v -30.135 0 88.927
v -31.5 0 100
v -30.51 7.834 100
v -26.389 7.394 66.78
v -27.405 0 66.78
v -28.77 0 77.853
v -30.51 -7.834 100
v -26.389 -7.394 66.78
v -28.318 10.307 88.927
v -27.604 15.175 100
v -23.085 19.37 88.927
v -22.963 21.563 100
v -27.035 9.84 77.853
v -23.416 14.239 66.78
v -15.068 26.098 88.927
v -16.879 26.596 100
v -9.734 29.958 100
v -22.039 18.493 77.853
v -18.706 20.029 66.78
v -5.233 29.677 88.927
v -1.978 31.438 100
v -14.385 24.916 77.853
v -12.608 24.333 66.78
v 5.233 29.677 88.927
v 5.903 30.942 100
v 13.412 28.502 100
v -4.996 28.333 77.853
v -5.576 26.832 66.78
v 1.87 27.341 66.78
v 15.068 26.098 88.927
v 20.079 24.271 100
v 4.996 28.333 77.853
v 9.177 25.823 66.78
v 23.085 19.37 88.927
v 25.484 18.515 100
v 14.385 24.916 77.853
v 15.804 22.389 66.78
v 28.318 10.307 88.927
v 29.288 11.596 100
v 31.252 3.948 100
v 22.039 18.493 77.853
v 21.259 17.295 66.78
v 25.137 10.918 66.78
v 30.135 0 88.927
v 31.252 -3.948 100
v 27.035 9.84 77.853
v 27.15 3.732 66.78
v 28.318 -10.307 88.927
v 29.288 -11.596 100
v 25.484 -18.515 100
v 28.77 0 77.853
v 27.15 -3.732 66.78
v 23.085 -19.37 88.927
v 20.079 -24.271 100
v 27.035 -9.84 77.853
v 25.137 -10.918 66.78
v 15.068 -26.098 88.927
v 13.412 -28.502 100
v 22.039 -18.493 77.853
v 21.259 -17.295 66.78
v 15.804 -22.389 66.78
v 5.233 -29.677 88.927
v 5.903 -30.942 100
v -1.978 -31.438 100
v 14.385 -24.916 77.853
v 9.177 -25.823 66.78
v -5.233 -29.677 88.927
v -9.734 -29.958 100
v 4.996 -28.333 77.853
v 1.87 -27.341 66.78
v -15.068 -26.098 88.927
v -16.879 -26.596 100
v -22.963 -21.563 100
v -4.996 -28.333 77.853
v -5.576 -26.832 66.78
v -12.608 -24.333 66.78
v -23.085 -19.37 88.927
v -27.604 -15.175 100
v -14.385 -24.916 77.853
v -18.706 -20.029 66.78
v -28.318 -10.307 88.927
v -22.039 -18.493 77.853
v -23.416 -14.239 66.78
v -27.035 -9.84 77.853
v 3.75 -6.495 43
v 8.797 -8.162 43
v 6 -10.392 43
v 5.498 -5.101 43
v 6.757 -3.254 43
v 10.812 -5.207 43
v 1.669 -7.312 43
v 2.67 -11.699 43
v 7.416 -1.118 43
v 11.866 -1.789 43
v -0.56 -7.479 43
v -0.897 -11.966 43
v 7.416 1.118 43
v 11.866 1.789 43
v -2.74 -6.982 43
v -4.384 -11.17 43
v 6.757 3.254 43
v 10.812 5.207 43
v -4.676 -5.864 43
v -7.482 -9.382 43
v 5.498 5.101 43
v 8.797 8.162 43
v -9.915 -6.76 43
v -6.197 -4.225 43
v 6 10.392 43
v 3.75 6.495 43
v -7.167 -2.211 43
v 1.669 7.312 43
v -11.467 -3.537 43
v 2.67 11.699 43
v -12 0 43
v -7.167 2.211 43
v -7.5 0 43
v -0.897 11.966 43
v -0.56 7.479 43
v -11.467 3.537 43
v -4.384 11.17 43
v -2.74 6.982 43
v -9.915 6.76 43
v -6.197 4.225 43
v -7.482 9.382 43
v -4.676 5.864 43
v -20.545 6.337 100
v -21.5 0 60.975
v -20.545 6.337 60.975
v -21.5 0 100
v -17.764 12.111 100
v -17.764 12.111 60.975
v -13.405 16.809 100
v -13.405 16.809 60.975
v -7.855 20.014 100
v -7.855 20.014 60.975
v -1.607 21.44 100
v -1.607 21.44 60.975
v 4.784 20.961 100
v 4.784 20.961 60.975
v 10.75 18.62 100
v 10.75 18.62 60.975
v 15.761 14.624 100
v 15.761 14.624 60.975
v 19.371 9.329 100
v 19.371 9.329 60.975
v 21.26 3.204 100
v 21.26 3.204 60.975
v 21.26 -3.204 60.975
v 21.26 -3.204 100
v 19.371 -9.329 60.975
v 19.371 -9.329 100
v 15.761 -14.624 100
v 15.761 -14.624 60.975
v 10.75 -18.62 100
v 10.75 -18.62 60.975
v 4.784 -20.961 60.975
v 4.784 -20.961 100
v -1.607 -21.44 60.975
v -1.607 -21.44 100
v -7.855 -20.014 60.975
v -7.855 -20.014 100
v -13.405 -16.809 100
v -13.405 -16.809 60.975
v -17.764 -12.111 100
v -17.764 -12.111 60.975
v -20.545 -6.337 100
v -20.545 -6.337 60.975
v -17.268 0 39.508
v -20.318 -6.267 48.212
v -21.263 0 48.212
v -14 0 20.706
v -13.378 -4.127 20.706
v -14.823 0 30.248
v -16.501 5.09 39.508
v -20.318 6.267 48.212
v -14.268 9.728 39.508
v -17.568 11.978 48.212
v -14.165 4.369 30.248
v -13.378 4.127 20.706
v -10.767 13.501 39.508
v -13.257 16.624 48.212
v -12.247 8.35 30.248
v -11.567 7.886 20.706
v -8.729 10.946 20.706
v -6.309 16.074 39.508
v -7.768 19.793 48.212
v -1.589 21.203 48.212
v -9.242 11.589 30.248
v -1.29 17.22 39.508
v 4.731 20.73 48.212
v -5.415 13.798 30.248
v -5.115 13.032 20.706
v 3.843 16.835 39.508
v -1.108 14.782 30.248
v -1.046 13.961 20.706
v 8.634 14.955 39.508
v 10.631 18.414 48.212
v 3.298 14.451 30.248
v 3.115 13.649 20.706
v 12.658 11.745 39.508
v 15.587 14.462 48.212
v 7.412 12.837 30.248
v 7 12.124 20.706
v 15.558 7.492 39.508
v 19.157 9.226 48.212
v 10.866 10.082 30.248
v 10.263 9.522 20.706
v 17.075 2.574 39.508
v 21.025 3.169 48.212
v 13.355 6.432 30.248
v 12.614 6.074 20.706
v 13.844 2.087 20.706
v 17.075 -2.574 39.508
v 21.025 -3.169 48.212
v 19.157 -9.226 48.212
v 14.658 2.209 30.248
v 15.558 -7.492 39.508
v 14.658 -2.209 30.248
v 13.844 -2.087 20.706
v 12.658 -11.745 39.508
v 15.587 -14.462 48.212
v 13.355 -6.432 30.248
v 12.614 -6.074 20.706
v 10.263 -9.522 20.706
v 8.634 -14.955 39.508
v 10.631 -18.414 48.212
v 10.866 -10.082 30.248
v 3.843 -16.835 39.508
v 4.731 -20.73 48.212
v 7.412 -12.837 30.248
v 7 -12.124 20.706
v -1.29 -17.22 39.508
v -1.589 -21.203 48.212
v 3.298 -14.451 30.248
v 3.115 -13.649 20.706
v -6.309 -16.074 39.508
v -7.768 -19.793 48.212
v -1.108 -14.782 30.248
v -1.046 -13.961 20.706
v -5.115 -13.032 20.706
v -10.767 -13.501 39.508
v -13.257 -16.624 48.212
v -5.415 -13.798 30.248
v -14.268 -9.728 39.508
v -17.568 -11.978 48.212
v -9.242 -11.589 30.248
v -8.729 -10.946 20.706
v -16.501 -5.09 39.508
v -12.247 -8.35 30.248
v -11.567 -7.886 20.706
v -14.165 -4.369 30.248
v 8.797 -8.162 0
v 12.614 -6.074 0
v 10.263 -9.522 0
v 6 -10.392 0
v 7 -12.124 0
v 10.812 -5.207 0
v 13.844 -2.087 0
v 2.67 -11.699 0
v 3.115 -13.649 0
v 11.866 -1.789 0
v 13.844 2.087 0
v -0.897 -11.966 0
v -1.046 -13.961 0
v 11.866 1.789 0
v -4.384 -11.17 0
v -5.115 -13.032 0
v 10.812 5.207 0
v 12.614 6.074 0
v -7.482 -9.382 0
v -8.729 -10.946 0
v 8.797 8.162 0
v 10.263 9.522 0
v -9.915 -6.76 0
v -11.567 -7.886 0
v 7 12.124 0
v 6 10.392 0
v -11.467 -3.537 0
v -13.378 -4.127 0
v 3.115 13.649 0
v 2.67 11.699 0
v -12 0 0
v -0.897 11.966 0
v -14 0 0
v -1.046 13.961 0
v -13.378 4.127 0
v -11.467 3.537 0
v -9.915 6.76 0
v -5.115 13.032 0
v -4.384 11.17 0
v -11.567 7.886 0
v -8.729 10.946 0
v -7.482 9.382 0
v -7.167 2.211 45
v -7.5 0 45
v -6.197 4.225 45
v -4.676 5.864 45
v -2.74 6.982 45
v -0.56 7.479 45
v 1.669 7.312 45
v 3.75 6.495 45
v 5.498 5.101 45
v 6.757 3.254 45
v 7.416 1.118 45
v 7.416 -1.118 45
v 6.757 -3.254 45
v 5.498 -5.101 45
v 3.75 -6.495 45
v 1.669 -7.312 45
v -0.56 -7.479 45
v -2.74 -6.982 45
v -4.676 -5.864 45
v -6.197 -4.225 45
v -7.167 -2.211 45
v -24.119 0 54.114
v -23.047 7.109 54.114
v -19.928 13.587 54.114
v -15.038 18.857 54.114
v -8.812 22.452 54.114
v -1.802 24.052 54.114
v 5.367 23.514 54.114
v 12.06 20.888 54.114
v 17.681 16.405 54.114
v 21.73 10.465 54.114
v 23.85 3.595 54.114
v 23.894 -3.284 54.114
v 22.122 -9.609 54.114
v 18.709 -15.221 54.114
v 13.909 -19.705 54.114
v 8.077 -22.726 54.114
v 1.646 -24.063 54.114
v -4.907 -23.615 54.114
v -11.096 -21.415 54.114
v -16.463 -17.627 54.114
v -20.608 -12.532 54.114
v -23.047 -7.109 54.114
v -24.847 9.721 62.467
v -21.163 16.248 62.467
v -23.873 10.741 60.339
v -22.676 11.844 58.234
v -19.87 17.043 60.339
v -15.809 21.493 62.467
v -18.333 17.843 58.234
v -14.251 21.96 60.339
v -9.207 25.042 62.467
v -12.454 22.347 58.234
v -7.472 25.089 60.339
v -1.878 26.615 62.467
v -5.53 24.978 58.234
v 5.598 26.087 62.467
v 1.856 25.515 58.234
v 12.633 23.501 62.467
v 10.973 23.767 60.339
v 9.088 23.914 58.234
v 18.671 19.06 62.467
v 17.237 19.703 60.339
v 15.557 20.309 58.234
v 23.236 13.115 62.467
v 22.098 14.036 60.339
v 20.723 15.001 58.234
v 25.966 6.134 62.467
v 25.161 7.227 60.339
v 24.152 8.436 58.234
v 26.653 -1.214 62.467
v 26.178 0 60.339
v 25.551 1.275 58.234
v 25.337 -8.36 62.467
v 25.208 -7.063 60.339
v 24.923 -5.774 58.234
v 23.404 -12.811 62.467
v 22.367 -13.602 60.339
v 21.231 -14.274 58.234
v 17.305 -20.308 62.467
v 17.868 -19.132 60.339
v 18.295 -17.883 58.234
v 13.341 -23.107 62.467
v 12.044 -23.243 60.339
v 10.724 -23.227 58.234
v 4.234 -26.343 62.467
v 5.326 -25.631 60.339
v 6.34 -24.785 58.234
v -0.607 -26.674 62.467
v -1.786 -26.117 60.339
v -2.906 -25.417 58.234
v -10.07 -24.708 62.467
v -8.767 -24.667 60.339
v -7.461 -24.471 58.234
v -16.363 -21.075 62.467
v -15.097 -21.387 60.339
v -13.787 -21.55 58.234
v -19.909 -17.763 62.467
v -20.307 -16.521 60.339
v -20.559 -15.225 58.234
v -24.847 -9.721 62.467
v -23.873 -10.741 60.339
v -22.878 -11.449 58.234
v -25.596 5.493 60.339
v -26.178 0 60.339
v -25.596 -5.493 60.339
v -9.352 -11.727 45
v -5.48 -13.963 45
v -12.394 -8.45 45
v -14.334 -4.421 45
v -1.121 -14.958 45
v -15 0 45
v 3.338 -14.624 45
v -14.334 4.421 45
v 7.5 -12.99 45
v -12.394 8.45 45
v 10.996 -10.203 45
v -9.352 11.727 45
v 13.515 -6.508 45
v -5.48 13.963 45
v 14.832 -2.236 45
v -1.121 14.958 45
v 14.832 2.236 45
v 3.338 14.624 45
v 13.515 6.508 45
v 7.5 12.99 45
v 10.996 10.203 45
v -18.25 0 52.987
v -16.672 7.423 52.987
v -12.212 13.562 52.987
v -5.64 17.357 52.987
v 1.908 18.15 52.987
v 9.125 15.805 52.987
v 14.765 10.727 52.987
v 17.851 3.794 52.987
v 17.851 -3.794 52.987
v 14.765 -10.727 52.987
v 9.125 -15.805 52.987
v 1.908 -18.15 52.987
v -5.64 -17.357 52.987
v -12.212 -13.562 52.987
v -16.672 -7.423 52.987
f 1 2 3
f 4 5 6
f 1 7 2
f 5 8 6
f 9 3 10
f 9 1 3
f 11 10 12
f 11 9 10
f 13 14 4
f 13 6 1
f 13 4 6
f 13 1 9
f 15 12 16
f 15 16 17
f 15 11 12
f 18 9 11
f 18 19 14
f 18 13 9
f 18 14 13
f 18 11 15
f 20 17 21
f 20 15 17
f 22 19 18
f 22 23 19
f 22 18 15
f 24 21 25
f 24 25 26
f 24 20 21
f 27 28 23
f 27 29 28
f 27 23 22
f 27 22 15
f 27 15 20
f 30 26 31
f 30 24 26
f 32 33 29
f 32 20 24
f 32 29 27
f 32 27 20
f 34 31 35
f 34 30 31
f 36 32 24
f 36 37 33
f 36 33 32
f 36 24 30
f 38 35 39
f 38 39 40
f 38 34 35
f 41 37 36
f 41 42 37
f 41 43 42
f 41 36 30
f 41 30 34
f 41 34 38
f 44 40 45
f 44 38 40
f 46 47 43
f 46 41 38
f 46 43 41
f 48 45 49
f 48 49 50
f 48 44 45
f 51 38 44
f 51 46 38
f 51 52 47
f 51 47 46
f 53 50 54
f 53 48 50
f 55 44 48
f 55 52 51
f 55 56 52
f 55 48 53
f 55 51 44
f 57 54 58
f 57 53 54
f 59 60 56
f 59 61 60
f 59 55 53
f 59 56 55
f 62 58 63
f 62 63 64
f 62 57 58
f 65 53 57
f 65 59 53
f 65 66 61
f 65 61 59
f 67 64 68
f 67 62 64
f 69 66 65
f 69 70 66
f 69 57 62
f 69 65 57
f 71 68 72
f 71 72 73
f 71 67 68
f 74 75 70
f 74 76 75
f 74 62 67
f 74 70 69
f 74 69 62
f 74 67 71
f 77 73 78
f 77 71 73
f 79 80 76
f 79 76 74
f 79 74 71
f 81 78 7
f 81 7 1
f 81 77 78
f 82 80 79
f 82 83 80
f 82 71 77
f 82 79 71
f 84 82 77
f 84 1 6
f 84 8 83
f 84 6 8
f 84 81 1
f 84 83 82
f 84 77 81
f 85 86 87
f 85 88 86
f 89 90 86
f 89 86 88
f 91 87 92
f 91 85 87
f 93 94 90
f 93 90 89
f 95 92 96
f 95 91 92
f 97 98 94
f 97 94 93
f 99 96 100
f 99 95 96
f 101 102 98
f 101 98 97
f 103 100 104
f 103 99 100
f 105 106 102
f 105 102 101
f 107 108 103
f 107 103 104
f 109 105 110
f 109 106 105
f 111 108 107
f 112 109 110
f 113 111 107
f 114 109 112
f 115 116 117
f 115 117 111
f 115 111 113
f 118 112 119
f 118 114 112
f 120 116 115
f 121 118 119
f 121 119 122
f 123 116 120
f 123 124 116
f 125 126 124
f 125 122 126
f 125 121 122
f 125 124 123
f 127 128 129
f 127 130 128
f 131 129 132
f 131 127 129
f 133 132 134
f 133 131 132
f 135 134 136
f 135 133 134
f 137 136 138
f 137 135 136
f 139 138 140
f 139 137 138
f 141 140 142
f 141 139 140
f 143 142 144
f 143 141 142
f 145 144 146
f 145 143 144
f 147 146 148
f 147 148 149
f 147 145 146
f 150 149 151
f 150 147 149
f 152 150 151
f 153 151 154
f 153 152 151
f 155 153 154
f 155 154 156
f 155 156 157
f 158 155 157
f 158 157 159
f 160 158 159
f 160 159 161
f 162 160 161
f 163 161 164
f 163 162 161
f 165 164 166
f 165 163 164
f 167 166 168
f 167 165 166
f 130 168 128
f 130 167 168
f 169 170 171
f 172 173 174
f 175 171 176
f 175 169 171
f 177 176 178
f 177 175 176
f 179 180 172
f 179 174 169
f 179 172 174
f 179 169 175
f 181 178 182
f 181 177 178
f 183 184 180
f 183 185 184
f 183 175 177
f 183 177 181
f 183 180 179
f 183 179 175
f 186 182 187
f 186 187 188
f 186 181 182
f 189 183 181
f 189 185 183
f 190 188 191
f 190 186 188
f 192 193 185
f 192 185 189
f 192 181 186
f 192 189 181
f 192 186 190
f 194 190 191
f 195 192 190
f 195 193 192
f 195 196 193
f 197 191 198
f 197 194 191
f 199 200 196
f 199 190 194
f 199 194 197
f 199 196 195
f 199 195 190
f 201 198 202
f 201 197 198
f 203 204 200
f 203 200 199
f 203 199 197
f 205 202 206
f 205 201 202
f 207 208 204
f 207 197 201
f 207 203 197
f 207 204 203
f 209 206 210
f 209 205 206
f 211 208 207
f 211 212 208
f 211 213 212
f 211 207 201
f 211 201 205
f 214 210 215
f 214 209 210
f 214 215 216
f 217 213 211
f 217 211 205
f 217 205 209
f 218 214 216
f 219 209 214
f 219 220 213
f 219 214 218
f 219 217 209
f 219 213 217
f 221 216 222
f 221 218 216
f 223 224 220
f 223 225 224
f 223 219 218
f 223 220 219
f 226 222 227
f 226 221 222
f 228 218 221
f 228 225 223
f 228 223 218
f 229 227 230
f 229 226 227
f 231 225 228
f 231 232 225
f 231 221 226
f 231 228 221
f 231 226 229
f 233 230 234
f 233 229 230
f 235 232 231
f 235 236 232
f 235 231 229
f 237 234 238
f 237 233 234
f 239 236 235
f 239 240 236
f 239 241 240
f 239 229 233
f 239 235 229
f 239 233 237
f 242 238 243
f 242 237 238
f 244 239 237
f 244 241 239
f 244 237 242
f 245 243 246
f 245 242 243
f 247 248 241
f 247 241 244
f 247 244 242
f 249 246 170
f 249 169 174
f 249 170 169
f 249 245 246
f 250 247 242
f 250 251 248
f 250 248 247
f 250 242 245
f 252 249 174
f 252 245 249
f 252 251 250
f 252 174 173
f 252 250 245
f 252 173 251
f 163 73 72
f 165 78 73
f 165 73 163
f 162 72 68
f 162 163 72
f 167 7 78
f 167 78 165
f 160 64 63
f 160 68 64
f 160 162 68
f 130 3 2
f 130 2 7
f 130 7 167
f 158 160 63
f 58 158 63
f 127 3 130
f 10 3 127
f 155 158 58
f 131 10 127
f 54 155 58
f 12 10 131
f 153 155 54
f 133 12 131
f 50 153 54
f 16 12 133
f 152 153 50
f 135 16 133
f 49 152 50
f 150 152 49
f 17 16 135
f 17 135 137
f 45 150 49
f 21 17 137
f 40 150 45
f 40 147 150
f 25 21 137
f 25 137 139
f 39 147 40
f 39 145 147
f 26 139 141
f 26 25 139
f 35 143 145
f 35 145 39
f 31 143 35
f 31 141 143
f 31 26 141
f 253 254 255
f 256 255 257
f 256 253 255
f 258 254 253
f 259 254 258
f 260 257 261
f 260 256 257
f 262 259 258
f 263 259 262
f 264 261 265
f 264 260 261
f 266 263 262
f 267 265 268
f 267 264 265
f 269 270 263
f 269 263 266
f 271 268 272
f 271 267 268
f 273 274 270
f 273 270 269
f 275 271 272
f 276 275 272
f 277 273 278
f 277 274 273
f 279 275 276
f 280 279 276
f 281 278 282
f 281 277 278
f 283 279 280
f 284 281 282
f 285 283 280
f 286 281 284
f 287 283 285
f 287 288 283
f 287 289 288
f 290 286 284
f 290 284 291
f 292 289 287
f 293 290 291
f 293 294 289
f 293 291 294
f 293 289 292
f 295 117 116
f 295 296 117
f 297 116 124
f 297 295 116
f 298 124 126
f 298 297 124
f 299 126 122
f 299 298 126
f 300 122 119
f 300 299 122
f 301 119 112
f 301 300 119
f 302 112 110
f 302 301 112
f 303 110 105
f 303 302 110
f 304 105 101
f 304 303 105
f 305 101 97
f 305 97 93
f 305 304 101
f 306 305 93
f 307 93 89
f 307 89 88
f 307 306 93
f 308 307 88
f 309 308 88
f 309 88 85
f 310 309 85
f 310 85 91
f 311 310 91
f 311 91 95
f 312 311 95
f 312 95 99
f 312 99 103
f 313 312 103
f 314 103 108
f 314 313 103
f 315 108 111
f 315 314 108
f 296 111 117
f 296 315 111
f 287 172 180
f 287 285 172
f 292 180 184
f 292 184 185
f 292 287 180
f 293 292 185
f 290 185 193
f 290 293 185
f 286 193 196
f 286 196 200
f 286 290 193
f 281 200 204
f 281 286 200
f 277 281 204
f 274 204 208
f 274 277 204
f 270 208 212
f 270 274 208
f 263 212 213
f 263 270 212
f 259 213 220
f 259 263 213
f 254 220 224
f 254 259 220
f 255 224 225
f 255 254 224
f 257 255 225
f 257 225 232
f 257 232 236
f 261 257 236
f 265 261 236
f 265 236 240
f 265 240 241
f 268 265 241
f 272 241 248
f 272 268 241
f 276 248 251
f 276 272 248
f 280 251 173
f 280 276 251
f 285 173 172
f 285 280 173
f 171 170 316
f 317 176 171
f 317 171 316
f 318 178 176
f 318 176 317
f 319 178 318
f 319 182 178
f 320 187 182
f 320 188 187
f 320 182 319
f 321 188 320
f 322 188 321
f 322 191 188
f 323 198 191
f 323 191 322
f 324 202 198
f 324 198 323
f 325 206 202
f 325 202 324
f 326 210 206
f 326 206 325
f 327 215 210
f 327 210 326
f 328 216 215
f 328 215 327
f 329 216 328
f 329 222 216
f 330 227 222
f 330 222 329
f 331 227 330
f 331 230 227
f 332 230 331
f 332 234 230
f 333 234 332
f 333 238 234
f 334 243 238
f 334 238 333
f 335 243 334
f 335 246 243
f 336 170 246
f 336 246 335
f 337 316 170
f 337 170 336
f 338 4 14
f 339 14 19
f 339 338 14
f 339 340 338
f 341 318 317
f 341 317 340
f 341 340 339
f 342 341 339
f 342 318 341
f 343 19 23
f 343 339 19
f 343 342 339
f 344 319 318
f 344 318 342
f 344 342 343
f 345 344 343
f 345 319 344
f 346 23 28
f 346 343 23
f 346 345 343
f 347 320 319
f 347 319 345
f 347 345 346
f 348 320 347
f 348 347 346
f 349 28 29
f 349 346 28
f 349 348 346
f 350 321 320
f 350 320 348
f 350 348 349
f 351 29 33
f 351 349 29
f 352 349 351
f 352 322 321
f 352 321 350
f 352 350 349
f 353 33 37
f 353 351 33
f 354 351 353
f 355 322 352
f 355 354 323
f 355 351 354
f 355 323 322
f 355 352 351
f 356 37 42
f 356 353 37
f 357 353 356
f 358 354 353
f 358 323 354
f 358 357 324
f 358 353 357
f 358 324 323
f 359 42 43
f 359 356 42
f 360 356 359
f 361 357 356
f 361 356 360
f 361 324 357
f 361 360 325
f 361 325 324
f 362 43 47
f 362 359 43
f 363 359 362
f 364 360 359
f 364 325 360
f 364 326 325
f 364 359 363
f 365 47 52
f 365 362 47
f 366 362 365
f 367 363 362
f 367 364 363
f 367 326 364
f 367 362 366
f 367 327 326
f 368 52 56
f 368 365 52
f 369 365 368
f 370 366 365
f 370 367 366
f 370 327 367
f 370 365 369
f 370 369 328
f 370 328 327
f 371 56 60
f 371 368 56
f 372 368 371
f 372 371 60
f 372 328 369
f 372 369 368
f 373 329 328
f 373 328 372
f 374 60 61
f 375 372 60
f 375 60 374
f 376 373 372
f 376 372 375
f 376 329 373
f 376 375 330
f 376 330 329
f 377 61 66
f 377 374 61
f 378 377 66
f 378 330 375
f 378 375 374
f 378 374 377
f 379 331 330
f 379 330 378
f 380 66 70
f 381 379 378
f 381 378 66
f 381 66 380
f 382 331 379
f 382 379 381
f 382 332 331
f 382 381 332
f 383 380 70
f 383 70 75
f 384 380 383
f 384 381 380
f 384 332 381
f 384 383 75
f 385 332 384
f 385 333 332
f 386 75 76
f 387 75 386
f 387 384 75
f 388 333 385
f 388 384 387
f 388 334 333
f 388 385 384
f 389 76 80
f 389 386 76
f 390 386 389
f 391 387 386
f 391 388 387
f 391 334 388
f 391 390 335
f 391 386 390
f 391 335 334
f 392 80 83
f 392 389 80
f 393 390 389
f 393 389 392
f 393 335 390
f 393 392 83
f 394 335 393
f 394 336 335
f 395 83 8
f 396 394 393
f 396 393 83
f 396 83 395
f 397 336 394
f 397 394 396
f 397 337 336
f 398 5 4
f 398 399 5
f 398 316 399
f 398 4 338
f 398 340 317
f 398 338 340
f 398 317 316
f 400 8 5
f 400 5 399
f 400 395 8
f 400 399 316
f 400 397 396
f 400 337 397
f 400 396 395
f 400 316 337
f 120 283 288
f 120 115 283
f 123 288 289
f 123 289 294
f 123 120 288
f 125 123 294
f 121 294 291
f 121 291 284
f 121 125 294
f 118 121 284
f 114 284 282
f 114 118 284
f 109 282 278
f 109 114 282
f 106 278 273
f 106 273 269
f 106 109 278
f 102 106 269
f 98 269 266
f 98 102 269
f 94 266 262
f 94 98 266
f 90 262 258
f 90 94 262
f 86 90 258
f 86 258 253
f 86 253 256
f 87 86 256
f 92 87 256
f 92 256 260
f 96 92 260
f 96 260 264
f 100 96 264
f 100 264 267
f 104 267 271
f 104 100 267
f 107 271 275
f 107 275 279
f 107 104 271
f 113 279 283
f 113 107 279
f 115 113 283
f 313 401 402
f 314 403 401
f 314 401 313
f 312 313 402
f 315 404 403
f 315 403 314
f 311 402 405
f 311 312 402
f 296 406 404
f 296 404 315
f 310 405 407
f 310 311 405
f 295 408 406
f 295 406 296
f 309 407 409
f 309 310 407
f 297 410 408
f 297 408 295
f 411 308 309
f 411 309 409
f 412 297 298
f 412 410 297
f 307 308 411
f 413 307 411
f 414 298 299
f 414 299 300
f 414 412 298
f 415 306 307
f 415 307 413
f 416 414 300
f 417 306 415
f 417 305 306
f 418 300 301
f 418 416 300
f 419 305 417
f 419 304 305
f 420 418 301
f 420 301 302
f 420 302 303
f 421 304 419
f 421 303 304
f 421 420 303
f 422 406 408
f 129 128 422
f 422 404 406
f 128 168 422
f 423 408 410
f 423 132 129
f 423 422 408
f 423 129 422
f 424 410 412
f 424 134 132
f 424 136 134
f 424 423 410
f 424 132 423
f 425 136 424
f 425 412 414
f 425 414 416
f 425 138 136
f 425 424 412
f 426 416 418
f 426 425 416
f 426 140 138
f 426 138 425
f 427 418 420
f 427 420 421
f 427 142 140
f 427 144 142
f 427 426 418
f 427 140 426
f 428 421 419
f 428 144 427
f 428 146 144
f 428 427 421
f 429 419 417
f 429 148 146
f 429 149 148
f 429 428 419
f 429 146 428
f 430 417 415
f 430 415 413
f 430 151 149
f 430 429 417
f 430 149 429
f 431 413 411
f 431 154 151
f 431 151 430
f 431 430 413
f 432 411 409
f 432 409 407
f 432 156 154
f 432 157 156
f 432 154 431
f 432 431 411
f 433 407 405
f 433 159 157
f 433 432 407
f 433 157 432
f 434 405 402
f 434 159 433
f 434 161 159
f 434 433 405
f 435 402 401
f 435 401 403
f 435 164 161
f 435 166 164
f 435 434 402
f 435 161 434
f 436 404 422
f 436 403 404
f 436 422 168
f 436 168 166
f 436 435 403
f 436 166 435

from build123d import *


# Not quite as in the source:
# - a feature names something its author has since deleted; it is built from what else it names


with BuildPart() as f1:
    # F0 (on Front) → F1 (revolve)
    with BuildSketch(Plane.XZ):
        with BuildLine():
            ThreePointArc((-21.2629083544, 48.211786896), (-15.8463196743, 34.9304531122), (-14, 20.7063762118))
            Line((-14, 20.7063762118), (-14, 0))
            Line((-14, 0), (-12, 0))
            Line((-12, 0), (-12, 43))
            Line((-12, 43), (-7.5, 43))
            Line((-7.5, 43), (-7.5, 45))
            Line((-7.5, 45), (-15, 45))
            Line((-15, 45), (-21.5, 60.9745979309))
            Line((-21.5, 60.9745979309), (-21.5, 100))
            Line((-21.5, 100), (-31.5, 100))
            Line((-31.5, 100), (-27.405355799, 66.7795249261))
            ThreePointArc((-27.405355799, 66.7795249261), (-25.2508232926, 57.1924026226), (-21.2629083544, 48.211786896))
        make_face()
    revolve(axis=Axis((0, 0, -6.6078525846), (0, 0, -1)))


solid = f1.part
